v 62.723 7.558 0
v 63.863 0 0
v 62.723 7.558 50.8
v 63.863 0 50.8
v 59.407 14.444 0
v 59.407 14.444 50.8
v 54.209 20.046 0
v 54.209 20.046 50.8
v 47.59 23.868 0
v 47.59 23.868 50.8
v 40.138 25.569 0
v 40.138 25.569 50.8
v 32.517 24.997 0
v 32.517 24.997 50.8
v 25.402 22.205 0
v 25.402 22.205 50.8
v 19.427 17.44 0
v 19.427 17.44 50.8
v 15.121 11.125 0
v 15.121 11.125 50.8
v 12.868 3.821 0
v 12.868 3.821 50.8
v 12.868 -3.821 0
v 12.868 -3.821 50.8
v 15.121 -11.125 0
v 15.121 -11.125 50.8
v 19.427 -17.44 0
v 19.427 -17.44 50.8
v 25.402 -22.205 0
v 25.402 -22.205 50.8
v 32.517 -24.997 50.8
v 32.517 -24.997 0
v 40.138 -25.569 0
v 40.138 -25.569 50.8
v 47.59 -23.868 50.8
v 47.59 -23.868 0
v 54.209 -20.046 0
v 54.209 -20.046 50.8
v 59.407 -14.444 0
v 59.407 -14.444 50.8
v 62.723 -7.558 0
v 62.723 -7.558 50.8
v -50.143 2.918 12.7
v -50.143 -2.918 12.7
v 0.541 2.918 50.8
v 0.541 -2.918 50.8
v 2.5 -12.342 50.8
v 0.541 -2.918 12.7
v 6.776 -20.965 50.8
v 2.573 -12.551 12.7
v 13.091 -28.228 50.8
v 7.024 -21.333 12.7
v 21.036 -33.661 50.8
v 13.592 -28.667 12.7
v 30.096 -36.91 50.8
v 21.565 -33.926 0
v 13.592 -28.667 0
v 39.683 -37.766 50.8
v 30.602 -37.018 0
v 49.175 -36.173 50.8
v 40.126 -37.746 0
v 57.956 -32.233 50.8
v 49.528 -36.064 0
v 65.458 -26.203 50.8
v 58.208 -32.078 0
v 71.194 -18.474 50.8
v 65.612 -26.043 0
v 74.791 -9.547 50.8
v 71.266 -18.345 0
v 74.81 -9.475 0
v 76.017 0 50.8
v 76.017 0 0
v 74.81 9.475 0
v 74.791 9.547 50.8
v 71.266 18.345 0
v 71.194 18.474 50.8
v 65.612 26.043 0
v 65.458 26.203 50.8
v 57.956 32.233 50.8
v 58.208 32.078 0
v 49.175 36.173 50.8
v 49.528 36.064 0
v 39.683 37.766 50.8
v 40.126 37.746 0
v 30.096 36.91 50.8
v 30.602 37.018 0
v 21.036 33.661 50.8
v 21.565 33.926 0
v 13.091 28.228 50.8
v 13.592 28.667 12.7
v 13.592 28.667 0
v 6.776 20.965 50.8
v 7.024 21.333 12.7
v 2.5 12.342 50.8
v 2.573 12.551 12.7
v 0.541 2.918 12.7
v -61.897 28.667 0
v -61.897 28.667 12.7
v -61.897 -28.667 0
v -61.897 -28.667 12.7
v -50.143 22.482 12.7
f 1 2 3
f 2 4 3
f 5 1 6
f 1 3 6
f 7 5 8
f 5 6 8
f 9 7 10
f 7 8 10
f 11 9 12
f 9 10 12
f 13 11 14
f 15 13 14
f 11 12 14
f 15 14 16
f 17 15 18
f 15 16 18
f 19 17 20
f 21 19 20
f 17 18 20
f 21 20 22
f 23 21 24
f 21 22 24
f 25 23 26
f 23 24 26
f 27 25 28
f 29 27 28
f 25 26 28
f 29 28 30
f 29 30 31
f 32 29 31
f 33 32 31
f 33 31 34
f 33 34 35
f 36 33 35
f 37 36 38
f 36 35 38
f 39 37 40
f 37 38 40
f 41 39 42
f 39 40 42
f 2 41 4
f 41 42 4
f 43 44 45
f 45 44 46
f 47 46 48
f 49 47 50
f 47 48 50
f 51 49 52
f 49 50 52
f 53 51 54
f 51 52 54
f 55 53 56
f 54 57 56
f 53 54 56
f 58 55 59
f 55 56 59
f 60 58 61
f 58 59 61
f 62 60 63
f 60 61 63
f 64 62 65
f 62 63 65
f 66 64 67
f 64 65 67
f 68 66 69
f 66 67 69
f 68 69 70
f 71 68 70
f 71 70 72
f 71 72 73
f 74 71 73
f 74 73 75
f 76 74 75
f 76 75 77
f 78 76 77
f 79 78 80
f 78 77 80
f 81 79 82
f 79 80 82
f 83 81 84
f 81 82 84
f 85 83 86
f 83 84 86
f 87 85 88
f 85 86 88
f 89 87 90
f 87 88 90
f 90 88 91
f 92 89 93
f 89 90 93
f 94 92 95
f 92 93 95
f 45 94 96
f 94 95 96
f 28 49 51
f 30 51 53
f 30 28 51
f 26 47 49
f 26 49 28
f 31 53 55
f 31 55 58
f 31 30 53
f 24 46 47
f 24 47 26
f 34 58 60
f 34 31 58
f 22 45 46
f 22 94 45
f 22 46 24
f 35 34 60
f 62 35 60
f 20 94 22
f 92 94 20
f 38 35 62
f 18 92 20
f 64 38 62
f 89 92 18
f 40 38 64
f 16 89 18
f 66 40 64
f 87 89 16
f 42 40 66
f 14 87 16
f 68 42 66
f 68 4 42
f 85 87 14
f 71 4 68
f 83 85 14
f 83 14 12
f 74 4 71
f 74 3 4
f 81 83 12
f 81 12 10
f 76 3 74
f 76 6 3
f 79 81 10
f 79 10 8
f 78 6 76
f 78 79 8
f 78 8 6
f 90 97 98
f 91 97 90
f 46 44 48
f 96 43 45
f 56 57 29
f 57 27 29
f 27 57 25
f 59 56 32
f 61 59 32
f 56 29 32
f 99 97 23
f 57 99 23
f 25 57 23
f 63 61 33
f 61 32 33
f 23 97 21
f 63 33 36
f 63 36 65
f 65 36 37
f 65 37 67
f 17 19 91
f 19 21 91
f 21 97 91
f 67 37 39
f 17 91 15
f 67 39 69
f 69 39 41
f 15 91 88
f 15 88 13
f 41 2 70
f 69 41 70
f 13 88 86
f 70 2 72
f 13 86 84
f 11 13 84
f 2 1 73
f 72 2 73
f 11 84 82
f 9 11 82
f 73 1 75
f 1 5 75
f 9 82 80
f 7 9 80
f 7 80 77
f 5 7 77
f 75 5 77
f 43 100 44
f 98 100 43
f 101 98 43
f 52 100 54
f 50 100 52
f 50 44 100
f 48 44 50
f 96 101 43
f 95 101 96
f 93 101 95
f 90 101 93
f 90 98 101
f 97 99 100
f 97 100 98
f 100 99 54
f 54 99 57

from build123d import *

# Parameters (mm, degrees)
F0_W      = 123.794436
F0_H      = 57.333368
F1_DEPTH  = 12.7
F2_R      = 37.794385
F3_DEPTH  = 50.8
F4_R      = 25.640341
F5_DEPTH  = 50.8
F6_W      = 100.285656
F6_H      = 5.836856
F7_DEPTH  = 38.1
F8_R      = 25.640341
F9_DEPTH  = 50.8
F11_DEPTH = 25.4


with BuildPart() as f1:
    # F0 (on Top) → F1 (new body)
    with BuildSketch(Plane.XY):
        Rectangle(F0_W, F0_H)
    extrude(amount=F1_DEPTH)

    # F2 (on Top) → F3 (join)
    with BuildSketch(Plane.XY):
        with Locations((38.222246, 0)):
            Circle(F2_R)
    extrude(amount=F3_DEPTH)

    # F4 (on face) → F5 (cut)
    with BuildSketch(Plane.XY.offset(50.8)):
        with Locations((38.222246, 0)):
            Circle(F4_R)
    extrude(amount=-F5_DEPTH, mode=Mode.SUBTRACT)

    # F6 (on face) → F7 (join)
    with BuildSketch(Plane.XY.offset(12.7)):
        Rectangle(F6_W, F6_H)
    extrude(amount=F7_DEPTH)

    # F8 (on face) → F9 (cut)
    with BuildSketch(Plane.XY.offset(50.8)):
        with Locations((38.222246, 0)):
            Circle(F8_R)
    extrude(amount=-F9_DEPTH, mode=Mode.SUBTRACT)

    # F10 (on face) → F11 (cut)
    with BuildSketch(Plane.XZ.offset(2.918428)):
        Polygon((-50.142828, 12.7), (0.540708, 50.8), (-50.142828, 50.8), align=None)
    extrude(amount=-F11_DEPTH, mode=Mode.SUBTRACT)


solid = f1.part
